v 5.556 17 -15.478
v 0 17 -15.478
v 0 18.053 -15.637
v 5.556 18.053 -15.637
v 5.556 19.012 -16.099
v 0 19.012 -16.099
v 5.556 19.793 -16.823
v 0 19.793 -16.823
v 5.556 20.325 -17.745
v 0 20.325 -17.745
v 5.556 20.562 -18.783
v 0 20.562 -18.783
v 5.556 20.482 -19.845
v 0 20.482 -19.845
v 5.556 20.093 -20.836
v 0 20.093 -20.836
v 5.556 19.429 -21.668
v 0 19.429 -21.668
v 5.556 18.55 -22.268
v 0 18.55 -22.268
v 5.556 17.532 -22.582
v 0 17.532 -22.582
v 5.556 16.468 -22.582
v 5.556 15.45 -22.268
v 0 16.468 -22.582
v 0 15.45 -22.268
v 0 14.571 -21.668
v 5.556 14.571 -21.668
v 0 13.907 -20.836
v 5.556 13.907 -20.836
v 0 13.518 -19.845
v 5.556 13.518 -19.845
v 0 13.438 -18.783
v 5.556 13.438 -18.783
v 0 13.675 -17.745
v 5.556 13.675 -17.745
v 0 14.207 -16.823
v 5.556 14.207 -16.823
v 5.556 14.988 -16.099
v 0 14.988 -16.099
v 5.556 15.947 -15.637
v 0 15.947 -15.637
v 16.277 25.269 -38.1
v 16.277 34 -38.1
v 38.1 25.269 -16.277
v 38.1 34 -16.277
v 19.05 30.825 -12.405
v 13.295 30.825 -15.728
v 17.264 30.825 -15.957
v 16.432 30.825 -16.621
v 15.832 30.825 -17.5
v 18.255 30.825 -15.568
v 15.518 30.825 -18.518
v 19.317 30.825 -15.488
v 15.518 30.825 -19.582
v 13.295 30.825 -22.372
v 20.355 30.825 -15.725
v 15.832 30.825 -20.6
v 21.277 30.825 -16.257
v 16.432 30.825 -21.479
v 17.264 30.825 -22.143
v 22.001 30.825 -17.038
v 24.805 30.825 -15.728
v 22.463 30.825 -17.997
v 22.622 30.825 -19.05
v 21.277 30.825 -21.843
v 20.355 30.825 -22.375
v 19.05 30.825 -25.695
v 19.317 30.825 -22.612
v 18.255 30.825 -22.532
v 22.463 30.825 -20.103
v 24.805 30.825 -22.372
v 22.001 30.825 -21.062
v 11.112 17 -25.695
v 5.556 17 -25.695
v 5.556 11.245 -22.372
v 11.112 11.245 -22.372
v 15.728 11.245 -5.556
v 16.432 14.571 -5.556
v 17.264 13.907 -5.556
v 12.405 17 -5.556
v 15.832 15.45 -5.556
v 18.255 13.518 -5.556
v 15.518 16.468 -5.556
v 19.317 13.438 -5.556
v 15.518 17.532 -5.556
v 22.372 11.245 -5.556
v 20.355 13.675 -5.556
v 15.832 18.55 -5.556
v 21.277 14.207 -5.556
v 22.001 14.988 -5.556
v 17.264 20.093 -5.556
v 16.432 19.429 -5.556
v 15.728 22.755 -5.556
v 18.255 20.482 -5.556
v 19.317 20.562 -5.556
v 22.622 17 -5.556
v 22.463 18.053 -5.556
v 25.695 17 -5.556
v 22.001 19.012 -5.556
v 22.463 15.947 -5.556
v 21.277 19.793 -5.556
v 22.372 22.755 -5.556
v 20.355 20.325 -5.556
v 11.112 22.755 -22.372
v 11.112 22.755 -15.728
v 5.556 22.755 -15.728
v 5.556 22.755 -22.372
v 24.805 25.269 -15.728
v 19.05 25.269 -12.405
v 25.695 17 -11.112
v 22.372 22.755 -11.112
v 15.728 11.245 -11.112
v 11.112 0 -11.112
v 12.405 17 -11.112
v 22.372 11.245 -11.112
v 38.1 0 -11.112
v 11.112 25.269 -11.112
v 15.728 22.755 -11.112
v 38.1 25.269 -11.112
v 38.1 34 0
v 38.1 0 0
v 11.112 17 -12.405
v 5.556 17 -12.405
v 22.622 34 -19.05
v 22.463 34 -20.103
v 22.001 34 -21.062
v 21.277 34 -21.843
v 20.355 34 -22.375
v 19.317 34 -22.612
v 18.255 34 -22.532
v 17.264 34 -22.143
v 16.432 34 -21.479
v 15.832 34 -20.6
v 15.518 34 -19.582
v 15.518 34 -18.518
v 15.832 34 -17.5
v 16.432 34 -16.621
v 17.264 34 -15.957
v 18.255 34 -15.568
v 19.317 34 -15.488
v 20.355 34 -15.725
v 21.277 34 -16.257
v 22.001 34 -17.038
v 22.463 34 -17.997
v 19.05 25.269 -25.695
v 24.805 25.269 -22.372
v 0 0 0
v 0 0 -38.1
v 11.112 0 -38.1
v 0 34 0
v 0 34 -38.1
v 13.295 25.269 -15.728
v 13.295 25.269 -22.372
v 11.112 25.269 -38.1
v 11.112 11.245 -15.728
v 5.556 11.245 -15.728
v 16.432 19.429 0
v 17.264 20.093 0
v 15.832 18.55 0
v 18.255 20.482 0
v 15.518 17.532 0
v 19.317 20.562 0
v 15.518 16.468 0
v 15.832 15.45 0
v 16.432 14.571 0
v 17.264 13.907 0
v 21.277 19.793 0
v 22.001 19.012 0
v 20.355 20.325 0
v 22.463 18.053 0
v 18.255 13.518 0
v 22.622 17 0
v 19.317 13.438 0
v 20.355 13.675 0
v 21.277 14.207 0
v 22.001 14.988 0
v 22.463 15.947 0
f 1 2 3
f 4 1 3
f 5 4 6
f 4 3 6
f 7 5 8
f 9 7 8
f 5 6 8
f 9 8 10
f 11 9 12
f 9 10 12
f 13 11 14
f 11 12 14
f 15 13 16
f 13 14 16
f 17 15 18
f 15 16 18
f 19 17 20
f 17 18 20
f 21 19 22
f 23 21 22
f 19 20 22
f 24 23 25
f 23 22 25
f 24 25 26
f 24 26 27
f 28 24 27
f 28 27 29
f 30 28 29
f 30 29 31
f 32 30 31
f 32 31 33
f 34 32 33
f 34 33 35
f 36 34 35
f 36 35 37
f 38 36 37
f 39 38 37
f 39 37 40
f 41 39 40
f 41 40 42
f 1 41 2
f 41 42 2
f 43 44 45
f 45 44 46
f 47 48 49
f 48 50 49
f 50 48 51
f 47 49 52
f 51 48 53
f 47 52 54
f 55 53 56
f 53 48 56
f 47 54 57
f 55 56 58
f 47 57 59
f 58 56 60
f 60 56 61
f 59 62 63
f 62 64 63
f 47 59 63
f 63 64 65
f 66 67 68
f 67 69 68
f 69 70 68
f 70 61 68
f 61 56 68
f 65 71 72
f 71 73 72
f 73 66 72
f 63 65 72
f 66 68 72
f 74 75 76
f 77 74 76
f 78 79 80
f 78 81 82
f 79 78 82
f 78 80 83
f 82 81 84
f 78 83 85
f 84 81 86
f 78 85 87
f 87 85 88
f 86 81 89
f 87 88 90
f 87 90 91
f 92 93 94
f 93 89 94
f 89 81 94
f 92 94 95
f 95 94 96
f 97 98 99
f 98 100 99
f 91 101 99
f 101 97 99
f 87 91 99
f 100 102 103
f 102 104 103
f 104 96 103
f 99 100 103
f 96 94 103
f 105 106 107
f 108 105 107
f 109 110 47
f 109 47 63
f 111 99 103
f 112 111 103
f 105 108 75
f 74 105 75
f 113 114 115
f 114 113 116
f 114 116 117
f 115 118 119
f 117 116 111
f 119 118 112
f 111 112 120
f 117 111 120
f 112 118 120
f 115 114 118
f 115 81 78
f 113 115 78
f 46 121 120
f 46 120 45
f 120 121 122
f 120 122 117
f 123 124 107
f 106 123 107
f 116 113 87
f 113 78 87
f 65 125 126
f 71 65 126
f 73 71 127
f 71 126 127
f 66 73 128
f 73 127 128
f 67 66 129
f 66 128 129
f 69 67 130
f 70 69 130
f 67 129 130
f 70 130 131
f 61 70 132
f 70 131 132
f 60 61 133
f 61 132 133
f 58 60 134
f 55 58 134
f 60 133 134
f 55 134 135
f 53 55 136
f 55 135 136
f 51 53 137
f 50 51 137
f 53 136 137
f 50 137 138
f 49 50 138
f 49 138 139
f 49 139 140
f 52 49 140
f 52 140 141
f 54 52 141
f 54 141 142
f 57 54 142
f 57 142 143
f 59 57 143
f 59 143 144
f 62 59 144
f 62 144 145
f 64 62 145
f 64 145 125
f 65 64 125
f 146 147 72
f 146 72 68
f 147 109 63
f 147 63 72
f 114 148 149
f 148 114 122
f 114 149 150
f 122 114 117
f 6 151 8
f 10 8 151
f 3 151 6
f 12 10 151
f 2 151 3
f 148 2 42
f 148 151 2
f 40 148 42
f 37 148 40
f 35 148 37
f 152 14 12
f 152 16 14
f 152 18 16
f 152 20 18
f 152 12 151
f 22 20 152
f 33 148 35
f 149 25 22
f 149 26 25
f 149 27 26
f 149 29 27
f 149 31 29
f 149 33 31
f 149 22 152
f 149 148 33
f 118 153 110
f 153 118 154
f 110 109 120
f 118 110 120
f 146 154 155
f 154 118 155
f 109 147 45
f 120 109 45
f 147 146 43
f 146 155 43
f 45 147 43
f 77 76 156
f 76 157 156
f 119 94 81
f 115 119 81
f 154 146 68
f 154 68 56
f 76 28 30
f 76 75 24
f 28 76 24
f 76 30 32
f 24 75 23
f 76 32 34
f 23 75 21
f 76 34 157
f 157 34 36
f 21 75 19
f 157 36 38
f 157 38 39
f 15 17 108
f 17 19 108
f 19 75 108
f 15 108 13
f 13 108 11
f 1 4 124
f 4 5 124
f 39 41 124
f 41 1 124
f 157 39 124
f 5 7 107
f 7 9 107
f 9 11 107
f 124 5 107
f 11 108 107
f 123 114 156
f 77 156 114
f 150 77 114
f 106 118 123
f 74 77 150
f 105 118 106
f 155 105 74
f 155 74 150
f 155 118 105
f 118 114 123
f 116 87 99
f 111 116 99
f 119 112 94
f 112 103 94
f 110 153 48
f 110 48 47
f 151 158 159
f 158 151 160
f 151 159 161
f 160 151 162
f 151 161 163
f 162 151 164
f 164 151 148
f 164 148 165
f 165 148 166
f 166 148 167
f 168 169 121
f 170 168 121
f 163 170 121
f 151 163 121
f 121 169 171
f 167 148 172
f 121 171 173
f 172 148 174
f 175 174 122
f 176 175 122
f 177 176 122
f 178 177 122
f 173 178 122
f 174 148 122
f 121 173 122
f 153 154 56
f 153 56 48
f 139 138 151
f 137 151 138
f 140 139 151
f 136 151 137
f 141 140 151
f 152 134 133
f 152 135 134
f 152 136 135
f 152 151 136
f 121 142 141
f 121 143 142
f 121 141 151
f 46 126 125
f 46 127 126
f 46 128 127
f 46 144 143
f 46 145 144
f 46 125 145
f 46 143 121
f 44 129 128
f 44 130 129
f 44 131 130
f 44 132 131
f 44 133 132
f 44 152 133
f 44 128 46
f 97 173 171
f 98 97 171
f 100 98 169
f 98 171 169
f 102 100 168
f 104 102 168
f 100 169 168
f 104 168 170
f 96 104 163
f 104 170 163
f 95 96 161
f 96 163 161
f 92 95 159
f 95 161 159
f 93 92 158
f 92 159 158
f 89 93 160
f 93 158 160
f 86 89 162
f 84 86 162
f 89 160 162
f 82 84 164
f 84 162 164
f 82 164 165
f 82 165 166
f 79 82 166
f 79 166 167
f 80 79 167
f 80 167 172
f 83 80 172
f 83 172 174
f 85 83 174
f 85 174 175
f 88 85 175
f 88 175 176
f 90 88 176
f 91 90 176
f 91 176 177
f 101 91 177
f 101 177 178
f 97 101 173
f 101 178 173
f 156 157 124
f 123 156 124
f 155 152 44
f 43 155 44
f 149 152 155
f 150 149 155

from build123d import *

# Parameters (mm, degrees)
SKETCH1_W                    = 38.1
SKETCH1_H                    = 38.1
MAIN_BODY_DEPTH              = 34
SKETCH3_R                    = 3.571875
F_9_32_RIGHT_RAIL_DEPTH      = 1
F_9_32_RIGHT_RAIL_DEPTH_BACK = 5.55625
SKETCH4_R                    = 3.571875
F_9_32_LEFT_RAIL_DEPTH       = 5.55625
SKETCH8_R                    = 3.571875
F_9_32_TOPPER_DEPTH          = 1
F_9_32_TOPPER_DEPTH_BACK     = 10
HEX_START                    = -5.55625
HEX_HOLE_RIGHT_DEPTH         = 32.54375
HEX_HOLE_LEFT_DEPTH          = 32.54375
INNER_START                  = -17.4625
SKETCH13_W                   = 26.9875
SKETCH13_H                   = 26.9875
INNER_CAVITY_DEPTH           = 8.73125
INNER_CAVITY_DEPTH_BACK      = 22.754687
HEX_START_2                  = -17
HEX_HOLE_TOP_DEPTH           = 13.825
TOP_CORNER_REACH             = 36


with BuildPart() as part:
    # Sketch1 → Main Body (new body)
    with BuildSketch(Plane(origin=(0, 0, 0), x_dir=(1, 0, 0), z_dir=(0, 1, 0))):
        with Locations((19.05, 19.05)):
            Rectangle(SKETCH1_W, SKETCH1_H)
    extrude(amount=MAIN_BODY_DEPTH)

    # Sketch3 → 9/32 Right Rail (cut, two sides)
    with BuildSketch(Plane.XY) as f_9_32_right_rail_sk:
        with Locations((19.05, 17)):
            Circle(SKETCH3_R)
    extrude(amount=F_9_32_RIGHT_RAIL_DEPTH, mode=Mode.SUBTRACT)
    extrude(f_9_32_right_rail_sk.sketch, amount=-F_9_32_RIGHT_RAIL_DEPTH_BACK, mode=Mode.SUBTRACT)

    # Sketch4 → 9/32 Left Rail (cut)
    with BuildSketch(Plane.ZY):
        with Locations((-19.05, 17)):
            Circle(SKETCH4_R)
    extrude(amount=-F_9_32_LEFT_RAIL_DEPTH, mode=Mode.SUBTRACT)

    # Sketch8 → 9/32 Topper (cut, two sides)
    with BuildSketch(Plane(origin=(0, 34, 0), x_dir=(1, 0, 0), z_dir=(0, 1, 0))) as f_9_32_topper_sk:
        with Locations((19.05, 19.05)):
            Circle(SKETCH8_R)
    extrude(amount=F_9_32_TOPPER_DEPTH, mode=Mode.SUBTRACT)
    extrude(f_9_32_topper_sk.sketch, amount=-F_9_32_TOPPER_DEPTH_BACK, mode=Mode.SUBTRACT)

    # Sketch9 → Hex Hole Right (cut)
    with BuildSketch(Plane.ZY.offset(HEX_START)):
        Polygon((-22.372470377, 22.7546875), (-25.694940754, 17), (-22.372470377, 11.2453125), (-15.727529623, 11.2453125), (-12.405059246, 17), (-15.727529623, 22.7546875), align=None)
    extrude(amount=-HEX_HOLE_RIGHT_DEPTH, mode=Mode.SUBTRACT)

    # Sketch10 → Hex Hole Left (cut)
    with BuildSketch(Plane.XY.offset(HEX_START)):
        Polygon((15.727529623, 22.7546875), (12.405059246, 17), (15.727529623, 11.2453125), (22.372470377, 11.2453125), (25.694940754, 17), (22.372470377, 22.7546875), align=None)
    extrude(amount=-HEX_HOLE_LEFT_DEPTH, mode=Mode.SUBTRACT)

    # Sketch13 → Inner Cavity (cut, two sides)
    with BuildSketch(Plane(origin=(0, 34, 0), x_dir=(1, 0, 0), z_dir=(0, 1, 0)).offset(INNER_START)) as inner_cavity_sk:
        with Locations((24.60625, 24.60625)):
            Rectangle(SKETCH13_W, SKETCH13_H)
    extrude(amount=INNER_CAVITY_DEPTH, mode=Mode.SUBTRACT)
    extrude(inner_cavity_sk.sketch, amount=-INNER_CAVITY_DEPTH_BACK, mode=Mode.SUBTRACT)

    # Sketch14 → Hex Hole Top (cut)
    with BuildSketch(Plane(origin=(0, 34, 0), x_dir=(1, 0, 0), z_dir=(0, 1, 0)).offset(HEX_START_2)):
        Polygon((24.8046875, 22.372470377), (19.05, 25.694940754), (13.2953125, 22.372470377), (13.2953125, 15.727529623), (19.05, 12.405059246), (24.8046875, 15.727529623), align=None)
    extrude(amount=HEX_HOLE_TOP_DEPTH, mode=Mode.SUBTRACT)

    # Sketch16 → Top Corner (cut, up to next)
    with BuildSketch(Plane(origin=(0, 34, 0), x_dir=(1, 0, 0), z_dir=(0, 1, 0)), mode=Mode.PRIVATE) as top_corner_sk1:
        Polygon((38.1, 38.1), (16.276714219, 38.1), (38.1, 16.276714219), align=None)
    top_corner_tool1 = extrude(top_corner_sk1.sketch, amount=-TOP_CORNER_REACH, mode=Mode.PRIVATE) & part.part
    add(top_corner_tool1.solids().sort_by_distance((30.825571, 34, -30.825571))[0], mode=Mode.SUBTRACT)


solid = part.part
